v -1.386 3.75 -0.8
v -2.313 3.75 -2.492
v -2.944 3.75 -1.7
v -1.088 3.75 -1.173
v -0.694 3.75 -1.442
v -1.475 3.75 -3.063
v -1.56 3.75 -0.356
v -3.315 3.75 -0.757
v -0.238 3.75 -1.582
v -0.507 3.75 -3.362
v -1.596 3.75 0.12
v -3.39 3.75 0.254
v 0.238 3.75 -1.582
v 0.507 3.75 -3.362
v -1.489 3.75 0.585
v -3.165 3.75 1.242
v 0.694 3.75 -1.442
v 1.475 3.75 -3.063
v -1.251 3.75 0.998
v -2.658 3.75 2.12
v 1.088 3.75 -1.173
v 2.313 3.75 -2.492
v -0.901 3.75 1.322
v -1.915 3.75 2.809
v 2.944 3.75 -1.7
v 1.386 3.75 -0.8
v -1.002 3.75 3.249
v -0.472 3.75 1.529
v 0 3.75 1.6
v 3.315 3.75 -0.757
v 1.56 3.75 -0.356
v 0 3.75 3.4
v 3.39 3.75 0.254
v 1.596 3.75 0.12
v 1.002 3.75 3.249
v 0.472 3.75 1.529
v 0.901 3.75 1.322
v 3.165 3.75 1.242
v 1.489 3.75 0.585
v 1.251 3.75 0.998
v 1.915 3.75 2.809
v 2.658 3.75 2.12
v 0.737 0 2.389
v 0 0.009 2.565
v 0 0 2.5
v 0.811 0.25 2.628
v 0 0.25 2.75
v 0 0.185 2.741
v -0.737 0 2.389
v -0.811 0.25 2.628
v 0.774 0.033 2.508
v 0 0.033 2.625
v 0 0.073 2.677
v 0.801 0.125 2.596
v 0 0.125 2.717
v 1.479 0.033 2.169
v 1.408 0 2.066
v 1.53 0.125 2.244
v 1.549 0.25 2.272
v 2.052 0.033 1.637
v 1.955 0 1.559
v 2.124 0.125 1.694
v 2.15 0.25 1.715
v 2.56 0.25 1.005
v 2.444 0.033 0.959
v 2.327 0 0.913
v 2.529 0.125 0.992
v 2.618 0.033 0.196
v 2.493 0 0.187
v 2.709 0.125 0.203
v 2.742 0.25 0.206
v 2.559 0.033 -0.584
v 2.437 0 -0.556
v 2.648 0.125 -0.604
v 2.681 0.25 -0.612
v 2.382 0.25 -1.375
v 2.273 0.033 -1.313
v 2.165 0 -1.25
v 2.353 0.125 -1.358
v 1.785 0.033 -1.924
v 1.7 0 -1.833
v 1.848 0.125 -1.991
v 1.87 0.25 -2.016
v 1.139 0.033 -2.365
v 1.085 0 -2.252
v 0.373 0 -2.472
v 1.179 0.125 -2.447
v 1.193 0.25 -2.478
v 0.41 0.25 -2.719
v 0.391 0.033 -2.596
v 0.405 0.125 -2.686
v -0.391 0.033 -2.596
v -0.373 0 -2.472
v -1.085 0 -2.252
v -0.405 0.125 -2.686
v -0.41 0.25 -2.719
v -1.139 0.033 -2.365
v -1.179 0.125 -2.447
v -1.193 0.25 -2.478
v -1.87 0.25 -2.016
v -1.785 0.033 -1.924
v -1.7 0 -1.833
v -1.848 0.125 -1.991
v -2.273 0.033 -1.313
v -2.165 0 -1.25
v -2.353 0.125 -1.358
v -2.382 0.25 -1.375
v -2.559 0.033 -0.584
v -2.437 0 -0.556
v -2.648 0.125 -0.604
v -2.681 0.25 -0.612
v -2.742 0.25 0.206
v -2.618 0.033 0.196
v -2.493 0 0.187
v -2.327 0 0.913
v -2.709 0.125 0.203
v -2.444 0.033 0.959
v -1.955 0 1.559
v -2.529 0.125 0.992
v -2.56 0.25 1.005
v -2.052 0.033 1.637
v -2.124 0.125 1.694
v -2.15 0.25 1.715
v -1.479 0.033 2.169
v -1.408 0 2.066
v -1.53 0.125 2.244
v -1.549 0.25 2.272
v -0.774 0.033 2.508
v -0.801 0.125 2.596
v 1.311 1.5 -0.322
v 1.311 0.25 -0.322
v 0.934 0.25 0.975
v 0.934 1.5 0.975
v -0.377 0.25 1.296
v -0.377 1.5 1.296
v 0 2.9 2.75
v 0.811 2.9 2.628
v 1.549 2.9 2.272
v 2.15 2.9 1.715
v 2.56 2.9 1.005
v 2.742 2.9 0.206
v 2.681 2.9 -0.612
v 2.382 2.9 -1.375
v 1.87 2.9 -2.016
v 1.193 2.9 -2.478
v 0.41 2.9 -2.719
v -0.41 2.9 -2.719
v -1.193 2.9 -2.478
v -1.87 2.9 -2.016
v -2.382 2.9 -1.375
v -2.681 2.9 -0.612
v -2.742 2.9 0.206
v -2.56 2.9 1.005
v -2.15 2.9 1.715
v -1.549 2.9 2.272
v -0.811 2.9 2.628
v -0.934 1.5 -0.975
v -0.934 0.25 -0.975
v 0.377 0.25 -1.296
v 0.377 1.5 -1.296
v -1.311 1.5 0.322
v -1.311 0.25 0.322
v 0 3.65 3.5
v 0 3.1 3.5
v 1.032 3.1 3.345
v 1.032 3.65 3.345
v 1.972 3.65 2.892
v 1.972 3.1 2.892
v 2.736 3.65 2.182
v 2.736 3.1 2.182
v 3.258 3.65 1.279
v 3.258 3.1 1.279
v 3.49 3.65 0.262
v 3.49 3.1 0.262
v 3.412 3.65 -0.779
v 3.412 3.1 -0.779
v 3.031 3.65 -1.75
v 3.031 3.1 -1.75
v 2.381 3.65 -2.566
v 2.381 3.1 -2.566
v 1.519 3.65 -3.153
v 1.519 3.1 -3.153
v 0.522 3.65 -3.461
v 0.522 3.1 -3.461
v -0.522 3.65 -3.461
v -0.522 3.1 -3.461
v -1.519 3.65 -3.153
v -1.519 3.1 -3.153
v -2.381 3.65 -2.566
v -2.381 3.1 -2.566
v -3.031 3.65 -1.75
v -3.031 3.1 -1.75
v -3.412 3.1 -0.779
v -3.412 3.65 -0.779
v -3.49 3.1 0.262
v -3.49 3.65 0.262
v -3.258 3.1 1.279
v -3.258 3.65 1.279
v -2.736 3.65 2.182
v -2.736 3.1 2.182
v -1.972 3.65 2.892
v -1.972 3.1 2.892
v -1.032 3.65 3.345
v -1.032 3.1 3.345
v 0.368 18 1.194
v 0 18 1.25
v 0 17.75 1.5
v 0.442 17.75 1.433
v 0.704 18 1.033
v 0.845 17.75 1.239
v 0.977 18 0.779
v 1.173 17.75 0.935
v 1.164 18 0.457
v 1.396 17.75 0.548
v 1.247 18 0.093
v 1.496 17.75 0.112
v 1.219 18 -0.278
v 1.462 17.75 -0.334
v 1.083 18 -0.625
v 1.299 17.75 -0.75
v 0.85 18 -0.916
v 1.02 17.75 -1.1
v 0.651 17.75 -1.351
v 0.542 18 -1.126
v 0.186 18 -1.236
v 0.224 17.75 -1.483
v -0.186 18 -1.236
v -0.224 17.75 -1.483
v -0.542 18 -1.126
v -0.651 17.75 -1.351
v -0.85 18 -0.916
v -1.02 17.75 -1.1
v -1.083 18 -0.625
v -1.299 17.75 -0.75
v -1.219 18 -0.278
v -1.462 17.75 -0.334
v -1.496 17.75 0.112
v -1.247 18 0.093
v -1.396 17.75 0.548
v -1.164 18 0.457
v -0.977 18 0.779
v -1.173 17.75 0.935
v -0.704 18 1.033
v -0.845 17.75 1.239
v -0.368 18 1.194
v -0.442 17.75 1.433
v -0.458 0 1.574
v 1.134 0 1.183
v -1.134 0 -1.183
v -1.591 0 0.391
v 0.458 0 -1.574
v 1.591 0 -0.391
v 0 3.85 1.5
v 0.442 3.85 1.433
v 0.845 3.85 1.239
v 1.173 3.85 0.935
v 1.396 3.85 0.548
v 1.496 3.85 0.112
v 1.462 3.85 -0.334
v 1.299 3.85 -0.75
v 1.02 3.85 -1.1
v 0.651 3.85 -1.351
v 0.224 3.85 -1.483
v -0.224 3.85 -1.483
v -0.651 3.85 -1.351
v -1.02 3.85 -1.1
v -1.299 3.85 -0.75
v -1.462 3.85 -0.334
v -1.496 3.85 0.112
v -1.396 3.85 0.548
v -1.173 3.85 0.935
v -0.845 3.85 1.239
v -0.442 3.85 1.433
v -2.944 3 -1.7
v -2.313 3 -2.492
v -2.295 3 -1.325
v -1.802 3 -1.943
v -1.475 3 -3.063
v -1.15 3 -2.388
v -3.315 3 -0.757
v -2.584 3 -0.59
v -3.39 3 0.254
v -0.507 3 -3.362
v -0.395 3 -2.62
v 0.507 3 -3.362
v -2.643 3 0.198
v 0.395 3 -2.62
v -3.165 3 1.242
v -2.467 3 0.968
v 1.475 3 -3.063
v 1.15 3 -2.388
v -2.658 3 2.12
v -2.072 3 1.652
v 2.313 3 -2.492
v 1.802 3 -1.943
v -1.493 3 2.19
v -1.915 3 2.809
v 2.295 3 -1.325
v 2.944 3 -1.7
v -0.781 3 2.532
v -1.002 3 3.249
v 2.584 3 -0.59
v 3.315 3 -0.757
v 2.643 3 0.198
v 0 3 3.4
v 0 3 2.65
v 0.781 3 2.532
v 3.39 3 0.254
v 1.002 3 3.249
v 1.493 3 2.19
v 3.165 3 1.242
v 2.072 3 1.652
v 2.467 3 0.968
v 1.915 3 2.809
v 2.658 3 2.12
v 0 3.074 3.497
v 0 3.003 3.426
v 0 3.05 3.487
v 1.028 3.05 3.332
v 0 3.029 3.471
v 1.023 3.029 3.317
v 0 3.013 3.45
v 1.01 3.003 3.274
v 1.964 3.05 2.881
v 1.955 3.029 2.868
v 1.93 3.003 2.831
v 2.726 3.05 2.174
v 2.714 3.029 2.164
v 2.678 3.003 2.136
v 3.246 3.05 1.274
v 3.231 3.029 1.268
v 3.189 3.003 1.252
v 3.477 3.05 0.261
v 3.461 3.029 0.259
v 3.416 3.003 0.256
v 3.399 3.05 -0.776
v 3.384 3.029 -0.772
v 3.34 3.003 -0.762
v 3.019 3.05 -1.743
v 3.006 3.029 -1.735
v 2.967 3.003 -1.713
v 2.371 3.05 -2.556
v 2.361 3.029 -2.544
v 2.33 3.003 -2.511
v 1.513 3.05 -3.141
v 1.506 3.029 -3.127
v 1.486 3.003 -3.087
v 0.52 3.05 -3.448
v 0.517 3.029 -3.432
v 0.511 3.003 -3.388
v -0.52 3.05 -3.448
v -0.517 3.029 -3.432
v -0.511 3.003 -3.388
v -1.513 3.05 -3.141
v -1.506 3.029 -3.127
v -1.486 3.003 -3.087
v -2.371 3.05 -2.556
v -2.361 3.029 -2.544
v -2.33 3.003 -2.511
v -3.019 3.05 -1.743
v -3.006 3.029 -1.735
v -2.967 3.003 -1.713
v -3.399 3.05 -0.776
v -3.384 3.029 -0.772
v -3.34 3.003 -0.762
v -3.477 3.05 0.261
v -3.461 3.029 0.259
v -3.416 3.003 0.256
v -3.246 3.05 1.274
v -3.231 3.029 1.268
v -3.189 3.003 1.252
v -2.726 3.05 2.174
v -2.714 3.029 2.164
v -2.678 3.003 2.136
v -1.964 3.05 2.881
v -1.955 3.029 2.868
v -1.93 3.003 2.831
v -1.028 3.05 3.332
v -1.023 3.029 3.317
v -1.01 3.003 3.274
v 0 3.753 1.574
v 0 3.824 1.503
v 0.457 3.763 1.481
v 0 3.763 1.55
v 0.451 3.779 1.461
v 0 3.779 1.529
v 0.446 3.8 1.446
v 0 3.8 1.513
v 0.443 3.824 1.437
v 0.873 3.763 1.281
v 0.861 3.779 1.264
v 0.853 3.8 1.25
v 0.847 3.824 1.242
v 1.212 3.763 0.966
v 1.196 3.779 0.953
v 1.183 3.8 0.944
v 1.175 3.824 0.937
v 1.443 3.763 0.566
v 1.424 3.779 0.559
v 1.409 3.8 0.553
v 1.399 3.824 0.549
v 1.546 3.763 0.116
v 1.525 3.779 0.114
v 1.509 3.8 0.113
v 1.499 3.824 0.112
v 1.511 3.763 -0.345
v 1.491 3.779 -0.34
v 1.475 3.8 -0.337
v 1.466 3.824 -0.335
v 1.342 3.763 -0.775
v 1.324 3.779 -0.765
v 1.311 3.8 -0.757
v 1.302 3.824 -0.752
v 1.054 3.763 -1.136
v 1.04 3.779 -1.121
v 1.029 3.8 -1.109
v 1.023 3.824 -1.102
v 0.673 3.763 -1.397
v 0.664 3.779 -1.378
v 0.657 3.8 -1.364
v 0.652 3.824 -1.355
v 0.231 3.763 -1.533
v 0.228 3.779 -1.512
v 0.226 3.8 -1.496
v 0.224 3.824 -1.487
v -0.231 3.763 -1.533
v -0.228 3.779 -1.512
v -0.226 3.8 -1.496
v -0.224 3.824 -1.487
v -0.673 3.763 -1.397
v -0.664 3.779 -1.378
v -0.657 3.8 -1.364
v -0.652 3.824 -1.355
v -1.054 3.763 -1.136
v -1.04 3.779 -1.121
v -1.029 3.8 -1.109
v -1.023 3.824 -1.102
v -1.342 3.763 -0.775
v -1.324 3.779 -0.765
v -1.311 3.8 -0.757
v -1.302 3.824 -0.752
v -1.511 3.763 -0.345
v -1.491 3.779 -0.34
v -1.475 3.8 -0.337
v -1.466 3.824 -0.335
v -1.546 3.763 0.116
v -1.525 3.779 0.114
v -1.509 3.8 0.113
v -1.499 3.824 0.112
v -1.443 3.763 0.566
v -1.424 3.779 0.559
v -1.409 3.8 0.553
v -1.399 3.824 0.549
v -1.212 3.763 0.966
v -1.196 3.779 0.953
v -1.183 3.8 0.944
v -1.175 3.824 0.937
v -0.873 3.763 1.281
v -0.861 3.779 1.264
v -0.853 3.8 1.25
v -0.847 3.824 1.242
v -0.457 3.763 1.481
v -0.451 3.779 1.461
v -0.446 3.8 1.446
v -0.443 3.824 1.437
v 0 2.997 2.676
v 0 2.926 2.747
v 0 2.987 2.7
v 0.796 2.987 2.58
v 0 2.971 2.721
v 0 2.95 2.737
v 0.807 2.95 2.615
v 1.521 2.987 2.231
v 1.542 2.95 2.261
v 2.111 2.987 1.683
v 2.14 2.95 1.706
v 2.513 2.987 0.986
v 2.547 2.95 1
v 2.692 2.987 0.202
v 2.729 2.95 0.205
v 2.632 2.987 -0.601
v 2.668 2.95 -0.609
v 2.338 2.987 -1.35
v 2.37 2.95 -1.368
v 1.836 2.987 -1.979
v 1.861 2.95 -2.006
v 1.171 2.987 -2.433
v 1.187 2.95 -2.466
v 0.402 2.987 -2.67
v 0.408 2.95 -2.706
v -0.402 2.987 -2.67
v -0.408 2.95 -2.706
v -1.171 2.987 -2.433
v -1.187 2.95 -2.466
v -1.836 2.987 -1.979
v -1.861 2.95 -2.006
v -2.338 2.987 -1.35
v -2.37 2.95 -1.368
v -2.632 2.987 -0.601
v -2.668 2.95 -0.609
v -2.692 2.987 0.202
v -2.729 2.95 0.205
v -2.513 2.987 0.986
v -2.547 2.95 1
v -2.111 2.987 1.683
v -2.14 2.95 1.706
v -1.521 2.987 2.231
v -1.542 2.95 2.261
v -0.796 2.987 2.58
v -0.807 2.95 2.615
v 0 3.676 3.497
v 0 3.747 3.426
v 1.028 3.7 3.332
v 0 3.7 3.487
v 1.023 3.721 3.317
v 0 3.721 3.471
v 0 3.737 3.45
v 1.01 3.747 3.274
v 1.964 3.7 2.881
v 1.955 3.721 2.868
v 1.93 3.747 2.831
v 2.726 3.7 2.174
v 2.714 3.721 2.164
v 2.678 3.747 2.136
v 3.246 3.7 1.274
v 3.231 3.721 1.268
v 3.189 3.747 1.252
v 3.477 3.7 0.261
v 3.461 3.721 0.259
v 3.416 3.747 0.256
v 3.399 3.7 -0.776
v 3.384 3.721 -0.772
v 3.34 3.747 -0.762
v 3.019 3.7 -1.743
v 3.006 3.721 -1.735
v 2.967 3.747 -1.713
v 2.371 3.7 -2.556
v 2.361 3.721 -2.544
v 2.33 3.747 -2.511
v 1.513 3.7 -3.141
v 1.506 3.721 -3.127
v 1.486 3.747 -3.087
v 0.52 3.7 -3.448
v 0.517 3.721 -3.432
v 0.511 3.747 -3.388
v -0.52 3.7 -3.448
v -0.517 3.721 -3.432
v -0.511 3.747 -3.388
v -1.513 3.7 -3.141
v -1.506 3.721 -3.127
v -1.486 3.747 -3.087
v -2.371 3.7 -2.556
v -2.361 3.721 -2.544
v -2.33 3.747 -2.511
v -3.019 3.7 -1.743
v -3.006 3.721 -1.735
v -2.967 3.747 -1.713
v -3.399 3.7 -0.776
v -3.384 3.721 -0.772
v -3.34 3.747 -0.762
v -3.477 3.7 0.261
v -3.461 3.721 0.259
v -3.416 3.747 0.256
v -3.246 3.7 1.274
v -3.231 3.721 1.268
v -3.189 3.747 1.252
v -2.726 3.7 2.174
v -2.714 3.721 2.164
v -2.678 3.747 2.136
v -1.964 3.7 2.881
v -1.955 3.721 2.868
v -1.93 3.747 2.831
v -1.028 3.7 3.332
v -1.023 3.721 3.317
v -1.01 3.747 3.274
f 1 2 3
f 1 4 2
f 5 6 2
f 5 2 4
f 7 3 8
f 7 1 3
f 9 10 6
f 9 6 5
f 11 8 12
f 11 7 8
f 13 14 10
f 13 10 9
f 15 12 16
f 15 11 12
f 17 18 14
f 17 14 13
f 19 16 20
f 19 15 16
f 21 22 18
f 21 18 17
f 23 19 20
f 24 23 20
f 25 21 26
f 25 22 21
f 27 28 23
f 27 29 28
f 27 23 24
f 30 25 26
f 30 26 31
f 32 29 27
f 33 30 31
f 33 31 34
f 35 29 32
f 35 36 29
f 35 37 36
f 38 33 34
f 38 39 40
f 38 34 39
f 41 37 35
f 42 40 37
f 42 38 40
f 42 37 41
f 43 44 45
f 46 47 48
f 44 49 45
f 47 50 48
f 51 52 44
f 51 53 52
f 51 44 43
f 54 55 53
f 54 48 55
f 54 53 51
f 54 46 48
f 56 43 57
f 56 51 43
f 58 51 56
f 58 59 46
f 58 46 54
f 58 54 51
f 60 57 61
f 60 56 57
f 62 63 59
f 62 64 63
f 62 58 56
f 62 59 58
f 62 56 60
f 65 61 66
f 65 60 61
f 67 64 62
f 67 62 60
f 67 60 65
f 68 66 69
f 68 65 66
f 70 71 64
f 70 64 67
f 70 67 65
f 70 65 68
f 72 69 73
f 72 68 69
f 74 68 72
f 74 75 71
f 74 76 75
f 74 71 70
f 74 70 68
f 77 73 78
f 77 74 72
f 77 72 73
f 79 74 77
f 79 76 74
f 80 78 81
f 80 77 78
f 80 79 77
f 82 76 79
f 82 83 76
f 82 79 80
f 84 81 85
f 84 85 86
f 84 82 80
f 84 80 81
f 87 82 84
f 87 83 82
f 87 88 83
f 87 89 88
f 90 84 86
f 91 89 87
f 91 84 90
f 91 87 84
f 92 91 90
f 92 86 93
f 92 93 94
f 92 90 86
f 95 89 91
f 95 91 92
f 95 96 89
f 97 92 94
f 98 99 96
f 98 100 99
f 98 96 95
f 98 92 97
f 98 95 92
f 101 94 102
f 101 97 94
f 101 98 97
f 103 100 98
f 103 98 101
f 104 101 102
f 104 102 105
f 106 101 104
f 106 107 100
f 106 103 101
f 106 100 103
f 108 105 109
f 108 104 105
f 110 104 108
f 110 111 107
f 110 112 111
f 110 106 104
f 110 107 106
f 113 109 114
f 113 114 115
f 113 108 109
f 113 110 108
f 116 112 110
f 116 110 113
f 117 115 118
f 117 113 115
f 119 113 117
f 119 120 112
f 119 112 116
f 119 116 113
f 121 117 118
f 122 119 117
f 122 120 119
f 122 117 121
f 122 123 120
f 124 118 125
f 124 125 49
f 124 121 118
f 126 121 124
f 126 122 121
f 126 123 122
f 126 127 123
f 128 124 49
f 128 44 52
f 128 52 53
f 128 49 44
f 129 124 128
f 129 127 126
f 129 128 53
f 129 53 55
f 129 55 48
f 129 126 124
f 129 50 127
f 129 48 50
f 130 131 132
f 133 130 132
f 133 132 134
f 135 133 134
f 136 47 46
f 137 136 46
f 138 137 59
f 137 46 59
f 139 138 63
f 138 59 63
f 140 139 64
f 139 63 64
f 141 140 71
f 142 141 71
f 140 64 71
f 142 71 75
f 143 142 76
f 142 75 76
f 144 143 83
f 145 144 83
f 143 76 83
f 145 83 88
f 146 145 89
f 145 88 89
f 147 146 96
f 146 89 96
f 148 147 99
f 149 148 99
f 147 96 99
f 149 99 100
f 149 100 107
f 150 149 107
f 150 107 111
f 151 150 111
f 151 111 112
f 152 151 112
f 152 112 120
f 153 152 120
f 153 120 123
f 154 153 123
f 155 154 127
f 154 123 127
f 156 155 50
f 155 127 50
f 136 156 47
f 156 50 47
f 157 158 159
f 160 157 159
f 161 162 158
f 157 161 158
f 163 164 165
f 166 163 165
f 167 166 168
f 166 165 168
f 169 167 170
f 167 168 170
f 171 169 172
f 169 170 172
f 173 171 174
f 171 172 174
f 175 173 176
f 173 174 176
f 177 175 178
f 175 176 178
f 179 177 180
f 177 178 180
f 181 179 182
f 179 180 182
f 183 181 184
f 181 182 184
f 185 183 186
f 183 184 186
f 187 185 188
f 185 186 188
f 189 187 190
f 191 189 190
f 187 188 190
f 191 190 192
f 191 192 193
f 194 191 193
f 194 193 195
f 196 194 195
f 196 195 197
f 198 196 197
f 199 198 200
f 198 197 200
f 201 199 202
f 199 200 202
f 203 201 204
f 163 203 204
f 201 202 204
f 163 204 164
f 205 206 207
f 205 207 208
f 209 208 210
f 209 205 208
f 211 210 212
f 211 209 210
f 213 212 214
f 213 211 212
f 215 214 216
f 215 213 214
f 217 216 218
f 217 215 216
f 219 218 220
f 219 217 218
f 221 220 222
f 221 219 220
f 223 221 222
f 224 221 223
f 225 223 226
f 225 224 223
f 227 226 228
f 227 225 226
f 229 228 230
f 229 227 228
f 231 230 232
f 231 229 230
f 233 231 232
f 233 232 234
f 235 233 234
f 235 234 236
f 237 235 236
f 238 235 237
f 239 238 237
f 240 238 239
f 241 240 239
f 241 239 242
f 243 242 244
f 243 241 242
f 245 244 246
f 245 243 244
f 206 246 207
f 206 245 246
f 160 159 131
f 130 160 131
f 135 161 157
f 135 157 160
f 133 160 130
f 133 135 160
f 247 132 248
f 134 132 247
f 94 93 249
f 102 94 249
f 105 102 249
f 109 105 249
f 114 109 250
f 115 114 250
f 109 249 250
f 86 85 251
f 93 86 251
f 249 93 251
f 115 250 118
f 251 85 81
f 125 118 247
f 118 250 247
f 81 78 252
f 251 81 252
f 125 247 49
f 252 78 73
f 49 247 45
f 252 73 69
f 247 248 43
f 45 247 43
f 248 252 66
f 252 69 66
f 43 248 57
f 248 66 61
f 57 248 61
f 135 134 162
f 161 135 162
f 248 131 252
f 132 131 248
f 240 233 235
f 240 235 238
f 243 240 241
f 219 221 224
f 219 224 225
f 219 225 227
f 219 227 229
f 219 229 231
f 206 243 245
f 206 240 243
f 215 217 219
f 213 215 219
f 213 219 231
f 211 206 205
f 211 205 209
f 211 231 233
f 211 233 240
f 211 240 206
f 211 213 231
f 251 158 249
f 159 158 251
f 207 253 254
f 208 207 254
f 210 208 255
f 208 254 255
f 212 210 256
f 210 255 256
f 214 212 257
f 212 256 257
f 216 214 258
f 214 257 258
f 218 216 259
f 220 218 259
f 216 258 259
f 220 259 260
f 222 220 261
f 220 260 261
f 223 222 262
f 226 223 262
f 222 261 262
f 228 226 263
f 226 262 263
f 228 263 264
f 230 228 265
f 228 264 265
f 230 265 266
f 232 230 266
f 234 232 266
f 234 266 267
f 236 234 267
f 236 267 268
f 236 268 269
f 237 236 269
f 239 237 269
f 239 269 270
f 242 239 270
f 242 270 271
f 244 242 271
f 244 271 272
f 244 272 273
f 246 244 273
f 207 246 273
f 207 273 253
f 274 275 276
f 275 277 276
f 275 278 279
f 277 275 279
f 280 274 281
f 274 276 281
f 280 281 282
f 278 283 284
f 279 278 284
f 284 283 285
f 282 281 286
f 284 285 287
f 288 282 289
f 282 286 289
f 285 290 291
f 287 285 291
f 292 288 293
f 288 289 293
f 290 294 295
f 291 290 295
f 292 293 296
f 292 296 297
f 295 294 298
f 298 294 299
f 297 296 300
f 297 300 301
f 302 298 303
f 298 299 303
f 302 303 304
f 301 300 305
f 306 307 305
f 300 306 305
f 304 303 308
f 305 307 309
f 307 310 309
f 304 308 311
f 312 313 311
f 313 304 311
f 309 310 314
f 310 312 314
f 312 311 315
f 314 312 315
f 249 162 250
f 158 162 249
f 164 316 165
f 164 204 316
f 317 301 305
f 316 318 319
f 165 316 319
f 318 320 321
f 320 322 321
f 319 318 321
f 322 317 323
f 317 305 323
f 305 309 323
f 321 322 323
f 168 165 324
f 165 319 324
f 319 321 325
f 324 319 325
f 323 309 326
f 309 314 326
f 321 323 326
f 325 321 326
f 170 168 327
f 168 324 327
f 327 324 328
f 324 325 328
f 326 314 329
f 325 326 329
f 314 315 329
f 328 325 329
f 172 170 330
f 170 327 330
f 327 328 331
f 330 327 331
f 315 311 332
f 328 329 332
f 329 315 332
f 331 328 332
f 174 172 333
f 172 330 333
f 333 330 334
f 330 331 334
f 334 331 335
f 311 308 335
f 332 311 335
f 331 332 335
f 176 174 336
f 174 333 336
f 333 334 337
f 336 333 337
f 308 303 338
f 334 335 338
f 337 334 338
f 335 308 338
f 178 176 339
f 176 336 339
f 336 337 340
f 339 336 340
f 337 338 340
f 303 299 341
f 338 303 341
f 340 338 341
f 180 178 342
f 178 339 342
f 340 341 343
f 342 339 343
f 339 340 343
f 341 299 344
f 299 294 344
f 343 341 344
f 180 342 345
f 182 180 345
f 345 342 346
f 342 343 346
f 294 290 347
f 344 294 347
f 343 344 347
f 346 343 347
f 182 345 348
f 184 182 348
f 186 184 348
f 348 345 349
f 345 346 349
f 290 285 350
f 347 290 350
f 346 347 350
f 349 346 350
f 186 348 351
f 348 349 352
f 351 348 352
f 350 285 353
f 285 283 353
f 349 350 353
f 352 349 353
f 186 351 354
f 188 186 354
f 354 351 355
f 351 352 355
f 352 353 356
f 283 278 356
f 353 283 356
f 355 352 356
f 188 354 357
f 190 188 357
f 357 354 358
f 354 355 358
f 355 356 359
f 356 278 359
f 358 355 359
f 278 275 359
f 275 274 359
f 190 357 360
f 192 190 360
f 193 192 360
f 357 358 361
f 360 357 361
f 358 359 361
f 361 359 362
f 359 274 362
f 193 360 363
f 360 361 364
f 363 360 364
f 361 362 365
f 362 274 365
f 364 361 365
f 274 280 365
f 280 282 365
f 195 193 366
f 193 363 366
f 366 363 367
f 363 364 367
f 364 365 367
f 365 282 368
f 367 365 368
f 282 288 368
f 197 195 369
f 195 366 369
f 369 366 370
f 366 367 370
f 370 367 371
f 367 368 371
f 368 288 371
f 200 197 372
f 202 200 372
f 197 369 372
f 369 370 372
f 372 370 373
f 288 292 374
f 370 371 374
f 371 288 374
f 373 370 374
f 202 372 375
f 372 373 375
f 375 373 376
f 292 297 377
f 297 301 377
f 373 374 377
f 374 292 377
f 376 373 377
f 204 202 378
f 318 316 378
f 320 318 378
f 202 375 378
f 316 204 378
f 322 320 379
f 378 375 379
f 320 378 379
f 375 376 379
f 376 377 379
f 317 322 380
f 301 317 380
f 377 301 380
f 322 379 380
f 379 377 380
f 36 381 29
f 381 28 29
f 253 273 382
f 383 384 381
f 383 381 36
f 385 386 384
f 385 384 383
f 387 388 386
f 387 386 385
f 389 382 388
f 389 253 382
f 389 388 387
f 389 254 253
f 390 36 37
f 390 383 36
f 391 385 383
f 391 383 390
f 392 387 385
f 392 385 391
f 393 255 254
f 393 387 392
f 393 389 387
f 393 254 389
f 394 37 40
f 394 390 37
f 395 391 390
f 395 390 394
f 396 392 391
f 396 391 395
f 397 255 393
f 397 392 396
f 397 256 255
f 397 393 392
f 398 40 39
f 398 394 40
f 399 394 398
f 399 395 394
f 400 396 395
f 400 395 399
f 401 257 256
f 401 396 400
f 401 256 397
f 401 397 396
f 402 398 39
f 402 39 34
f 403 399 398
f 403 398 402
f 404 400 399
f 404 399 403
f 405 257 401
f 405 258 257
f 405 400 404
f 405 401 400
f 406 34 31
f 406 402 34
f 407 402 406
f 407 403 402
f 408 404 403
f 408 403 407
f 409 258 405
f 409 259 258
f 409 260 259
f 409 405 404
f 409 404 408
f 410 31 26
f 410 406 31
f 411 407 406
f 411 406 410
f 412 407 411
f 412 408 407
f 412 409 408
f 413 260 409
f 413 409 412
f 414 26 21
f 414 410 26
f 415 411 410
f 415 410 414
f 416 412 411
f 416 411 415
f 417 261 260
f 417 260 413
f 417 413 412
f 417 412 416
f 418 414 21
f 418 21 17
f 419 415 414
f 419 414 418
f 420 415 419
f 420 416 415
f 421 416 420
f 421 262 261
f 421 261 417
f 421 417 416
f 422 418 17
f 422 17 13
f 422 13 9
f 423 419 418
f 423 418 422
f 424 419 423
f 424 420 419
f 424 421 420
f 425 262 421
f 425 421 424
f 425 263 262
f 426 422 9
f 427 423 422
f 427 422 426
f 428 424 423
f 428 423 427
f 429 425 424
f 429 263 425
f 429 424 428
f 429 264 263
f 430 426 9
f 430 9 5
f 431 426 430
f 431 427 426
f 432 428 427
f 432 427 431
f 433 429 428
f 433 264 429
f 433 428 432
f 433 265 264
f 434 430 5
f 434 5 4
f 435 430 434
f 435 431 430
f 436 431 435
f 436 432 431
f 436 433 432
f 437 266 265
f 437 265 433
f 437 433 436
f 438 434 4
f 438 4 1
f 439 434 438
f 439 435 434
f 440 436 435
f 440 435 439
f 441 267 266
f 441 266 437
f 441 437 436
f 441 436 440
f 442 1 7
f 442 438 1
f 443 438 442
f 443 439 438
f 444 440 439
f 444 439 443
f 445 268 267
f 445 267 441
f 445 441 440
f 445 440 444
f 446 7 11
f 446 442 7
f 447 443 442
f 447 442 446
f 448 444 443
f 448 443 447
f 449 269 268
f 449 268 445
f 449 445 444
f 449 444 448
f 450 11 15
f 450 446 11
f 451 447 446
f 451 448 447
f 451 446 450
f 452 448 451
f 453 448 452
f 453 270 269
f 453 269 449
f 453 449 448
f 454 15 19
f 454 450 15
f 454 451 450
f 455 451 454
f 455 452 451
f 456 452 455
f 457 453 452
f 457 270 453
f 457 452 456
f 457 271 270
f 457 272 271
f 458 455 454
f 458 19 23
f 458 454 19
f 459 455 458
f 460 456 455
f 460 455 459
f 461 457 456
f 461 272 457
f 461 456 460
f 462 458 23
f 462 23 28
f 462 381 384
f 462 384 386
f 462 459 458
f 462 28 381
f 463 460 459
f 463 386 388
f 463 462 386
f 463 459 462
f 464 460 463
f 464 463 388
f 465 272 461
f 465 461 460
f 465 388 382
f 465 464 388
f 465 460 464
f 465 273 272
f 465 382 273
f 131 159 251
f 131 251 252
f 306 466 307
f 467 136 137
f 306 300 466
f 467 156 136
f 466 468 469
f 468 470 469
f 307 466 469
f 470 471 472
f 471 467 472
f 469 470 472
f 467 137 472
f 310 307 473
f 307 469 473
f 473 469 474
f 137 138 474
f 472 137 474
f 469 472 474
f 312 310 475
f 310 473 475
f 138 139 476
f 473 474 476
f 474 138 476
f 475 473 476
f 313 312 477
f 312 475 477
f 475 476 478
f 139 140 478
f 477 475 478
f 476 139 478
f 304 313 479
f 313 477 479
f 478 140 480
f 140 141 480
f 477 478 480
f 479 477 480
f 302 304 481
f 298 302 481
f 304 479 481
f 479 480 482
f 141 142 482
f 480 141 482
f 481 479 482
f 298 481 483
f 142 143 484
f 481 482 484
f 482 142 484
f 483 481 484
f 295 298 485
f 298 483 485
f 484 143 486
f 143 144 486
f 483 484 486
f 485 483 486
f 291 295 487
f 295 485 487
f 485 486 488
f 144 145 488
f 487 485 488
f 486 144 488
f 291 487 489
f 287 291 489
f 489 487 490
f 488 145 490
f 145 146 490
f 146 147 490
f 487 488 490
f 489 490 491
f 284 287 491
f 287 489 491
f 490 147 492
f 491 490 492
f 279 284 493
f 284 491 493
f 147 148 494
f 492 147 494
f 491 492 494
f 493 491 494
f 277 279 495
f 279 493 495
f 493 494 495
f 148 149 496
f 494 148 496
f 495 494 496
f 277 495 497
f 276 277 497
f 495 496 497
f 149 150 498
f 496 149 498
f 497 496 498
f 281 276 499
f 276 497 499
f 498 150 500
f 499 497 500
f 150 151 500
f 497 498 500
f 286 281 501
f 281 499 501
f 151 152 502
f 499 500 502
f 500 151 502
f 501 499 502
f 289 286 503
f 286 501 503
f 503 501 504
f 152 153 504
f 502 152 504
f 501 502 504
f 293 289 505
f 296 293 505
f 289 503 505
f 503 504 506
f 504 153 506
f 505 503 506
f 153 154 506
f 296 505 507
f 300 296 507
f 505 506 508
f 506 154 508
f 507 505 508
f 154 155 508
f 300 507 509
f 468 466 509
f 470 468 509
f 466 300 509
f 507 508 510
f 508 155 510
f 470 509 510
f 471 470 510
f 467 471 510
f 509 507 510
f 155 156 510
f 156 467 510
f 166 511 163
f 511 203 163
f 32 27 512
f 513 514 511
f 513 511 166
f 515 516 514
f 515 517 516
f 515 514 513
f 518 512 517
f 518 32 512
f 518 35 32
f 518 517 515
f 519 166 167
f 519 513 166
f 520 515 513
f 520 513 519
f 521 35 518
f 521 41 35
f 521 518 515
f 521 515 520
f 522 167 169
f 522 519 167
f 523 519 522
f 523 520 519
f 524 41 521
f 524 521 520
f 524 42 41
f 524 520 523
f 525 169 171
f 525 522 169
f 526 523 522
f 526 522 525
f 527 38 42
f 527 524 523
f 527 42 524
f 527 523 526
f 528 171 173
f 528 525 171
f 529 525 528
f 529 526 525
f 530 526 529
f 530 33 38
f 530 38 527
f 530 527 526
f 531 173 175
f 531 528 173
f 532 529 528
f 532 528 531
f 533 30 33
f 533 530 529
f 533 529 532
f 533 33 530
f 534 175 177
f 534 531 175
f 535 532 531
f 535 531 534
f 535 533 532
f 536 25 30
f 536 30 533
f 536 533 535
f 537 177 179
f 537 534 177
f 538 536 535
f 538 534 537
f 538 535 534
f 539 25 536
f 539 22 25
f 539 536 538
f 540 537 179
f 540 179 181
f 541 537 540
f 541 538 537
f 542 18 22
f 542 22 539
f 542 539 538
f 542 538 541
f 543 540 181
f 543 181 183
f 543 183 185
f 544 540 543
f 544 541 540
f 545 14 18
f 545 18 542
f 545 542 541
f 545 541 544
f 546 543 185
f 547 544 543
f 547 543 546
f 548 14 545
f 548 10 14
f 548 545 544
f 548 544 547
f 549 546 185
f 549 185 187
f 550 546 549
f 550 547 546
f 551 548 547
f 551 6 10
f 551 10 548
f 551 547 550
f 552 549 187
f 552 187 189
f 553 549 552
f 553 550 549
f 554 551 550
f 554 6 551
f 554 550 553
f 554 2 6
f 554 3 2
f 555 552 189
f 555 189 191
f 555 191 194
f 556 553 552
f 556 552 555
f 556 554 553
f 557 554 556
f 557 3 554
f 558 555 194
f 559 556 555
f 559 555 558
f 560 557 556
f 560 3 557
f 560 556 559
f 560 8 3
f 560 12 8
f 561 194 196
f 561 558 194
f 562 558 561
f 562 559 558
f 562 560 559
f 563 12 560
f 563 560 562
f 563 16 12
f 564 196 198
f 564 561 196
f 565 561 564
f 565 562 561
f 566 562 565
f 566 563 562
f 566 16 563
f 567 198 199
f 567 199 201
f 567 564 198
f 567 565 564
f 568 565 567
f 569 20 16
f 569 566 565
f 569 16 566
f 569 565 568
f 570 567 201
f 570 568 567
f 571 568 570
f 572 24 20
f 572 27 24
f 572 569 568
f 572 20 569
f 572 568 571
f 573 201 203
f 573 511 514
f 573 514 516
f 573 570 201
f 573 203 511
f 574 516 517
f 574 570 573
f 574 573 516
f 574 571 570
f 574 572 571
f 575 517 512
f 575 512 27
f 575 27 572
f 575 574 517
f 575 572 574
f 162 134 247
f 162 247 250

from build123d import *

# Parameters (mm, degrees)
SKETCH1_R           = 2.75
BOSS_EXTRUDE1_DEPTH = 3
SKETCH2_R           = 1.5
BOSS_EXTRUDE2_DEPTH = 15
CUT_EXTRUDE1_DEPTH  = 1.5
CHAMFER1_SIZE       = 0.25
FILLET1_R           = 0.25
CHAMFER2_SIZE       = 0.25
FILLET2_R           = 0.1
SKETCH4_R           = 3.5
SKETCH4_R_2         = 1.5
BOSS_EXTRUDE3_DEPTH = 0.75
FILLET3_R           = 0.1


with BuildPart() as part:
    # Sketch1 → Boss-Extrude1 (new body)
    with BuildSketch(Plane(origin=(0, 0, 0), x_dir=(1, 0, 0), z_dir=(0, 1, 0))):
        with Locations(Location((0, 0, 0), (0, 0, 270))):
            Circle(SKETCH1_R)
    extrude(amount=BOSS_EXTRUDE1_DEPTH)

    # Sketch2 → Boss-Extrude2 (add)
    with BuildSketch(Plane(origin=(0, 3, 0), x_dir=(1, 0, 0), z_dir=(0, 1, 0))):
        with Locations(Location((0, 0, 0), (0, 0, 270))):
            Circle(SKETCH2_R)
    extrude(amount=BOSS_EXTRUDE2_DEPTH)

    # Sketch3 → Cut-Extrude1 (cut)
    with BuildSketch(Plane.XZ):
        Polygon((0.934168857, 0.974591477), (-0.376936549, 1.2963097), (-1.311105406, 0.321718223), (-0.934168857, -0.974591477), (0.376936549, -1.2963097), (1.311105406, -0.321718223), align=None)
    extrude(amount=-CUT_EXTRUDE1_DEPTH, mode=Mode.SUBTRACT)

    # Chamfer1
    chamfer1_edges = [part.edges().sort_by_distance(p)[0] for p in [
        (1.122637131, 0, 0.326436627),
        (0.278616154, 0, 1.135450588),
        (-0.844020977, 0, 0.809013962),
        (-1.122637131, 0, -0.326436627),
        (-0.278616154, 0, -1.135450588),
        (0.844020977, 0, -0.809013962),
    ]]
    chamfer(chamfer1_edges, length=CHAMFER1_SIZE)

    # Fillet1
    fillet1_edges = [part.edges().sort_by_distance(p)[0] for p in [
        (0, 0, -2.75),
    ]]
    fillet(fillet1_edges, radius=FILLET1_R)

    # Chamfer2
    chamfer2_edges = [part.edges().sort_by_distance(p)[0] for p in [
        (0, 18, -1.5),
    ]]
    chamfer(chamfer2_edges, length=CHAMFER2_SIZE)

    # Fillet2
    fillet2_edges = [part.edges().sort_by_distance(p)[0] for p in [
        (0, 3, -2.75),
    ]]
    fillet(fillet2_edges, radius=FILLET2_R)

    # Sketch4 → Boss-Extrude3 (add)
    with BuildSketch(Plane(origin=(0, 3, 0), x_dir=(1, 0, 0), z_dir=(0, 1, 0))):
        with Locations(Location((0, 0, 0), (0, 0, 270))):
            Circle(SKETCH4_R)
        with Locations(Location((0, 0, 0), (0, 0, 270))):
            Circle(SKETCH4_R_2, mode=Mode.SUBTRACT)
    extrude(amount=BOSS_EXTRUDE3_DEPTH)

    # Fillet3
    fillet3_edges = [part.edges().sort_by_distance(p)[0] for p in [
        (0, 3.75, -3.5),
        (0, 3, -3.5),
        (0, 3.75, -1.5),
    ]]
    fillet(fillet3_edges, radius=FILLET3_R)


solid = part.part
